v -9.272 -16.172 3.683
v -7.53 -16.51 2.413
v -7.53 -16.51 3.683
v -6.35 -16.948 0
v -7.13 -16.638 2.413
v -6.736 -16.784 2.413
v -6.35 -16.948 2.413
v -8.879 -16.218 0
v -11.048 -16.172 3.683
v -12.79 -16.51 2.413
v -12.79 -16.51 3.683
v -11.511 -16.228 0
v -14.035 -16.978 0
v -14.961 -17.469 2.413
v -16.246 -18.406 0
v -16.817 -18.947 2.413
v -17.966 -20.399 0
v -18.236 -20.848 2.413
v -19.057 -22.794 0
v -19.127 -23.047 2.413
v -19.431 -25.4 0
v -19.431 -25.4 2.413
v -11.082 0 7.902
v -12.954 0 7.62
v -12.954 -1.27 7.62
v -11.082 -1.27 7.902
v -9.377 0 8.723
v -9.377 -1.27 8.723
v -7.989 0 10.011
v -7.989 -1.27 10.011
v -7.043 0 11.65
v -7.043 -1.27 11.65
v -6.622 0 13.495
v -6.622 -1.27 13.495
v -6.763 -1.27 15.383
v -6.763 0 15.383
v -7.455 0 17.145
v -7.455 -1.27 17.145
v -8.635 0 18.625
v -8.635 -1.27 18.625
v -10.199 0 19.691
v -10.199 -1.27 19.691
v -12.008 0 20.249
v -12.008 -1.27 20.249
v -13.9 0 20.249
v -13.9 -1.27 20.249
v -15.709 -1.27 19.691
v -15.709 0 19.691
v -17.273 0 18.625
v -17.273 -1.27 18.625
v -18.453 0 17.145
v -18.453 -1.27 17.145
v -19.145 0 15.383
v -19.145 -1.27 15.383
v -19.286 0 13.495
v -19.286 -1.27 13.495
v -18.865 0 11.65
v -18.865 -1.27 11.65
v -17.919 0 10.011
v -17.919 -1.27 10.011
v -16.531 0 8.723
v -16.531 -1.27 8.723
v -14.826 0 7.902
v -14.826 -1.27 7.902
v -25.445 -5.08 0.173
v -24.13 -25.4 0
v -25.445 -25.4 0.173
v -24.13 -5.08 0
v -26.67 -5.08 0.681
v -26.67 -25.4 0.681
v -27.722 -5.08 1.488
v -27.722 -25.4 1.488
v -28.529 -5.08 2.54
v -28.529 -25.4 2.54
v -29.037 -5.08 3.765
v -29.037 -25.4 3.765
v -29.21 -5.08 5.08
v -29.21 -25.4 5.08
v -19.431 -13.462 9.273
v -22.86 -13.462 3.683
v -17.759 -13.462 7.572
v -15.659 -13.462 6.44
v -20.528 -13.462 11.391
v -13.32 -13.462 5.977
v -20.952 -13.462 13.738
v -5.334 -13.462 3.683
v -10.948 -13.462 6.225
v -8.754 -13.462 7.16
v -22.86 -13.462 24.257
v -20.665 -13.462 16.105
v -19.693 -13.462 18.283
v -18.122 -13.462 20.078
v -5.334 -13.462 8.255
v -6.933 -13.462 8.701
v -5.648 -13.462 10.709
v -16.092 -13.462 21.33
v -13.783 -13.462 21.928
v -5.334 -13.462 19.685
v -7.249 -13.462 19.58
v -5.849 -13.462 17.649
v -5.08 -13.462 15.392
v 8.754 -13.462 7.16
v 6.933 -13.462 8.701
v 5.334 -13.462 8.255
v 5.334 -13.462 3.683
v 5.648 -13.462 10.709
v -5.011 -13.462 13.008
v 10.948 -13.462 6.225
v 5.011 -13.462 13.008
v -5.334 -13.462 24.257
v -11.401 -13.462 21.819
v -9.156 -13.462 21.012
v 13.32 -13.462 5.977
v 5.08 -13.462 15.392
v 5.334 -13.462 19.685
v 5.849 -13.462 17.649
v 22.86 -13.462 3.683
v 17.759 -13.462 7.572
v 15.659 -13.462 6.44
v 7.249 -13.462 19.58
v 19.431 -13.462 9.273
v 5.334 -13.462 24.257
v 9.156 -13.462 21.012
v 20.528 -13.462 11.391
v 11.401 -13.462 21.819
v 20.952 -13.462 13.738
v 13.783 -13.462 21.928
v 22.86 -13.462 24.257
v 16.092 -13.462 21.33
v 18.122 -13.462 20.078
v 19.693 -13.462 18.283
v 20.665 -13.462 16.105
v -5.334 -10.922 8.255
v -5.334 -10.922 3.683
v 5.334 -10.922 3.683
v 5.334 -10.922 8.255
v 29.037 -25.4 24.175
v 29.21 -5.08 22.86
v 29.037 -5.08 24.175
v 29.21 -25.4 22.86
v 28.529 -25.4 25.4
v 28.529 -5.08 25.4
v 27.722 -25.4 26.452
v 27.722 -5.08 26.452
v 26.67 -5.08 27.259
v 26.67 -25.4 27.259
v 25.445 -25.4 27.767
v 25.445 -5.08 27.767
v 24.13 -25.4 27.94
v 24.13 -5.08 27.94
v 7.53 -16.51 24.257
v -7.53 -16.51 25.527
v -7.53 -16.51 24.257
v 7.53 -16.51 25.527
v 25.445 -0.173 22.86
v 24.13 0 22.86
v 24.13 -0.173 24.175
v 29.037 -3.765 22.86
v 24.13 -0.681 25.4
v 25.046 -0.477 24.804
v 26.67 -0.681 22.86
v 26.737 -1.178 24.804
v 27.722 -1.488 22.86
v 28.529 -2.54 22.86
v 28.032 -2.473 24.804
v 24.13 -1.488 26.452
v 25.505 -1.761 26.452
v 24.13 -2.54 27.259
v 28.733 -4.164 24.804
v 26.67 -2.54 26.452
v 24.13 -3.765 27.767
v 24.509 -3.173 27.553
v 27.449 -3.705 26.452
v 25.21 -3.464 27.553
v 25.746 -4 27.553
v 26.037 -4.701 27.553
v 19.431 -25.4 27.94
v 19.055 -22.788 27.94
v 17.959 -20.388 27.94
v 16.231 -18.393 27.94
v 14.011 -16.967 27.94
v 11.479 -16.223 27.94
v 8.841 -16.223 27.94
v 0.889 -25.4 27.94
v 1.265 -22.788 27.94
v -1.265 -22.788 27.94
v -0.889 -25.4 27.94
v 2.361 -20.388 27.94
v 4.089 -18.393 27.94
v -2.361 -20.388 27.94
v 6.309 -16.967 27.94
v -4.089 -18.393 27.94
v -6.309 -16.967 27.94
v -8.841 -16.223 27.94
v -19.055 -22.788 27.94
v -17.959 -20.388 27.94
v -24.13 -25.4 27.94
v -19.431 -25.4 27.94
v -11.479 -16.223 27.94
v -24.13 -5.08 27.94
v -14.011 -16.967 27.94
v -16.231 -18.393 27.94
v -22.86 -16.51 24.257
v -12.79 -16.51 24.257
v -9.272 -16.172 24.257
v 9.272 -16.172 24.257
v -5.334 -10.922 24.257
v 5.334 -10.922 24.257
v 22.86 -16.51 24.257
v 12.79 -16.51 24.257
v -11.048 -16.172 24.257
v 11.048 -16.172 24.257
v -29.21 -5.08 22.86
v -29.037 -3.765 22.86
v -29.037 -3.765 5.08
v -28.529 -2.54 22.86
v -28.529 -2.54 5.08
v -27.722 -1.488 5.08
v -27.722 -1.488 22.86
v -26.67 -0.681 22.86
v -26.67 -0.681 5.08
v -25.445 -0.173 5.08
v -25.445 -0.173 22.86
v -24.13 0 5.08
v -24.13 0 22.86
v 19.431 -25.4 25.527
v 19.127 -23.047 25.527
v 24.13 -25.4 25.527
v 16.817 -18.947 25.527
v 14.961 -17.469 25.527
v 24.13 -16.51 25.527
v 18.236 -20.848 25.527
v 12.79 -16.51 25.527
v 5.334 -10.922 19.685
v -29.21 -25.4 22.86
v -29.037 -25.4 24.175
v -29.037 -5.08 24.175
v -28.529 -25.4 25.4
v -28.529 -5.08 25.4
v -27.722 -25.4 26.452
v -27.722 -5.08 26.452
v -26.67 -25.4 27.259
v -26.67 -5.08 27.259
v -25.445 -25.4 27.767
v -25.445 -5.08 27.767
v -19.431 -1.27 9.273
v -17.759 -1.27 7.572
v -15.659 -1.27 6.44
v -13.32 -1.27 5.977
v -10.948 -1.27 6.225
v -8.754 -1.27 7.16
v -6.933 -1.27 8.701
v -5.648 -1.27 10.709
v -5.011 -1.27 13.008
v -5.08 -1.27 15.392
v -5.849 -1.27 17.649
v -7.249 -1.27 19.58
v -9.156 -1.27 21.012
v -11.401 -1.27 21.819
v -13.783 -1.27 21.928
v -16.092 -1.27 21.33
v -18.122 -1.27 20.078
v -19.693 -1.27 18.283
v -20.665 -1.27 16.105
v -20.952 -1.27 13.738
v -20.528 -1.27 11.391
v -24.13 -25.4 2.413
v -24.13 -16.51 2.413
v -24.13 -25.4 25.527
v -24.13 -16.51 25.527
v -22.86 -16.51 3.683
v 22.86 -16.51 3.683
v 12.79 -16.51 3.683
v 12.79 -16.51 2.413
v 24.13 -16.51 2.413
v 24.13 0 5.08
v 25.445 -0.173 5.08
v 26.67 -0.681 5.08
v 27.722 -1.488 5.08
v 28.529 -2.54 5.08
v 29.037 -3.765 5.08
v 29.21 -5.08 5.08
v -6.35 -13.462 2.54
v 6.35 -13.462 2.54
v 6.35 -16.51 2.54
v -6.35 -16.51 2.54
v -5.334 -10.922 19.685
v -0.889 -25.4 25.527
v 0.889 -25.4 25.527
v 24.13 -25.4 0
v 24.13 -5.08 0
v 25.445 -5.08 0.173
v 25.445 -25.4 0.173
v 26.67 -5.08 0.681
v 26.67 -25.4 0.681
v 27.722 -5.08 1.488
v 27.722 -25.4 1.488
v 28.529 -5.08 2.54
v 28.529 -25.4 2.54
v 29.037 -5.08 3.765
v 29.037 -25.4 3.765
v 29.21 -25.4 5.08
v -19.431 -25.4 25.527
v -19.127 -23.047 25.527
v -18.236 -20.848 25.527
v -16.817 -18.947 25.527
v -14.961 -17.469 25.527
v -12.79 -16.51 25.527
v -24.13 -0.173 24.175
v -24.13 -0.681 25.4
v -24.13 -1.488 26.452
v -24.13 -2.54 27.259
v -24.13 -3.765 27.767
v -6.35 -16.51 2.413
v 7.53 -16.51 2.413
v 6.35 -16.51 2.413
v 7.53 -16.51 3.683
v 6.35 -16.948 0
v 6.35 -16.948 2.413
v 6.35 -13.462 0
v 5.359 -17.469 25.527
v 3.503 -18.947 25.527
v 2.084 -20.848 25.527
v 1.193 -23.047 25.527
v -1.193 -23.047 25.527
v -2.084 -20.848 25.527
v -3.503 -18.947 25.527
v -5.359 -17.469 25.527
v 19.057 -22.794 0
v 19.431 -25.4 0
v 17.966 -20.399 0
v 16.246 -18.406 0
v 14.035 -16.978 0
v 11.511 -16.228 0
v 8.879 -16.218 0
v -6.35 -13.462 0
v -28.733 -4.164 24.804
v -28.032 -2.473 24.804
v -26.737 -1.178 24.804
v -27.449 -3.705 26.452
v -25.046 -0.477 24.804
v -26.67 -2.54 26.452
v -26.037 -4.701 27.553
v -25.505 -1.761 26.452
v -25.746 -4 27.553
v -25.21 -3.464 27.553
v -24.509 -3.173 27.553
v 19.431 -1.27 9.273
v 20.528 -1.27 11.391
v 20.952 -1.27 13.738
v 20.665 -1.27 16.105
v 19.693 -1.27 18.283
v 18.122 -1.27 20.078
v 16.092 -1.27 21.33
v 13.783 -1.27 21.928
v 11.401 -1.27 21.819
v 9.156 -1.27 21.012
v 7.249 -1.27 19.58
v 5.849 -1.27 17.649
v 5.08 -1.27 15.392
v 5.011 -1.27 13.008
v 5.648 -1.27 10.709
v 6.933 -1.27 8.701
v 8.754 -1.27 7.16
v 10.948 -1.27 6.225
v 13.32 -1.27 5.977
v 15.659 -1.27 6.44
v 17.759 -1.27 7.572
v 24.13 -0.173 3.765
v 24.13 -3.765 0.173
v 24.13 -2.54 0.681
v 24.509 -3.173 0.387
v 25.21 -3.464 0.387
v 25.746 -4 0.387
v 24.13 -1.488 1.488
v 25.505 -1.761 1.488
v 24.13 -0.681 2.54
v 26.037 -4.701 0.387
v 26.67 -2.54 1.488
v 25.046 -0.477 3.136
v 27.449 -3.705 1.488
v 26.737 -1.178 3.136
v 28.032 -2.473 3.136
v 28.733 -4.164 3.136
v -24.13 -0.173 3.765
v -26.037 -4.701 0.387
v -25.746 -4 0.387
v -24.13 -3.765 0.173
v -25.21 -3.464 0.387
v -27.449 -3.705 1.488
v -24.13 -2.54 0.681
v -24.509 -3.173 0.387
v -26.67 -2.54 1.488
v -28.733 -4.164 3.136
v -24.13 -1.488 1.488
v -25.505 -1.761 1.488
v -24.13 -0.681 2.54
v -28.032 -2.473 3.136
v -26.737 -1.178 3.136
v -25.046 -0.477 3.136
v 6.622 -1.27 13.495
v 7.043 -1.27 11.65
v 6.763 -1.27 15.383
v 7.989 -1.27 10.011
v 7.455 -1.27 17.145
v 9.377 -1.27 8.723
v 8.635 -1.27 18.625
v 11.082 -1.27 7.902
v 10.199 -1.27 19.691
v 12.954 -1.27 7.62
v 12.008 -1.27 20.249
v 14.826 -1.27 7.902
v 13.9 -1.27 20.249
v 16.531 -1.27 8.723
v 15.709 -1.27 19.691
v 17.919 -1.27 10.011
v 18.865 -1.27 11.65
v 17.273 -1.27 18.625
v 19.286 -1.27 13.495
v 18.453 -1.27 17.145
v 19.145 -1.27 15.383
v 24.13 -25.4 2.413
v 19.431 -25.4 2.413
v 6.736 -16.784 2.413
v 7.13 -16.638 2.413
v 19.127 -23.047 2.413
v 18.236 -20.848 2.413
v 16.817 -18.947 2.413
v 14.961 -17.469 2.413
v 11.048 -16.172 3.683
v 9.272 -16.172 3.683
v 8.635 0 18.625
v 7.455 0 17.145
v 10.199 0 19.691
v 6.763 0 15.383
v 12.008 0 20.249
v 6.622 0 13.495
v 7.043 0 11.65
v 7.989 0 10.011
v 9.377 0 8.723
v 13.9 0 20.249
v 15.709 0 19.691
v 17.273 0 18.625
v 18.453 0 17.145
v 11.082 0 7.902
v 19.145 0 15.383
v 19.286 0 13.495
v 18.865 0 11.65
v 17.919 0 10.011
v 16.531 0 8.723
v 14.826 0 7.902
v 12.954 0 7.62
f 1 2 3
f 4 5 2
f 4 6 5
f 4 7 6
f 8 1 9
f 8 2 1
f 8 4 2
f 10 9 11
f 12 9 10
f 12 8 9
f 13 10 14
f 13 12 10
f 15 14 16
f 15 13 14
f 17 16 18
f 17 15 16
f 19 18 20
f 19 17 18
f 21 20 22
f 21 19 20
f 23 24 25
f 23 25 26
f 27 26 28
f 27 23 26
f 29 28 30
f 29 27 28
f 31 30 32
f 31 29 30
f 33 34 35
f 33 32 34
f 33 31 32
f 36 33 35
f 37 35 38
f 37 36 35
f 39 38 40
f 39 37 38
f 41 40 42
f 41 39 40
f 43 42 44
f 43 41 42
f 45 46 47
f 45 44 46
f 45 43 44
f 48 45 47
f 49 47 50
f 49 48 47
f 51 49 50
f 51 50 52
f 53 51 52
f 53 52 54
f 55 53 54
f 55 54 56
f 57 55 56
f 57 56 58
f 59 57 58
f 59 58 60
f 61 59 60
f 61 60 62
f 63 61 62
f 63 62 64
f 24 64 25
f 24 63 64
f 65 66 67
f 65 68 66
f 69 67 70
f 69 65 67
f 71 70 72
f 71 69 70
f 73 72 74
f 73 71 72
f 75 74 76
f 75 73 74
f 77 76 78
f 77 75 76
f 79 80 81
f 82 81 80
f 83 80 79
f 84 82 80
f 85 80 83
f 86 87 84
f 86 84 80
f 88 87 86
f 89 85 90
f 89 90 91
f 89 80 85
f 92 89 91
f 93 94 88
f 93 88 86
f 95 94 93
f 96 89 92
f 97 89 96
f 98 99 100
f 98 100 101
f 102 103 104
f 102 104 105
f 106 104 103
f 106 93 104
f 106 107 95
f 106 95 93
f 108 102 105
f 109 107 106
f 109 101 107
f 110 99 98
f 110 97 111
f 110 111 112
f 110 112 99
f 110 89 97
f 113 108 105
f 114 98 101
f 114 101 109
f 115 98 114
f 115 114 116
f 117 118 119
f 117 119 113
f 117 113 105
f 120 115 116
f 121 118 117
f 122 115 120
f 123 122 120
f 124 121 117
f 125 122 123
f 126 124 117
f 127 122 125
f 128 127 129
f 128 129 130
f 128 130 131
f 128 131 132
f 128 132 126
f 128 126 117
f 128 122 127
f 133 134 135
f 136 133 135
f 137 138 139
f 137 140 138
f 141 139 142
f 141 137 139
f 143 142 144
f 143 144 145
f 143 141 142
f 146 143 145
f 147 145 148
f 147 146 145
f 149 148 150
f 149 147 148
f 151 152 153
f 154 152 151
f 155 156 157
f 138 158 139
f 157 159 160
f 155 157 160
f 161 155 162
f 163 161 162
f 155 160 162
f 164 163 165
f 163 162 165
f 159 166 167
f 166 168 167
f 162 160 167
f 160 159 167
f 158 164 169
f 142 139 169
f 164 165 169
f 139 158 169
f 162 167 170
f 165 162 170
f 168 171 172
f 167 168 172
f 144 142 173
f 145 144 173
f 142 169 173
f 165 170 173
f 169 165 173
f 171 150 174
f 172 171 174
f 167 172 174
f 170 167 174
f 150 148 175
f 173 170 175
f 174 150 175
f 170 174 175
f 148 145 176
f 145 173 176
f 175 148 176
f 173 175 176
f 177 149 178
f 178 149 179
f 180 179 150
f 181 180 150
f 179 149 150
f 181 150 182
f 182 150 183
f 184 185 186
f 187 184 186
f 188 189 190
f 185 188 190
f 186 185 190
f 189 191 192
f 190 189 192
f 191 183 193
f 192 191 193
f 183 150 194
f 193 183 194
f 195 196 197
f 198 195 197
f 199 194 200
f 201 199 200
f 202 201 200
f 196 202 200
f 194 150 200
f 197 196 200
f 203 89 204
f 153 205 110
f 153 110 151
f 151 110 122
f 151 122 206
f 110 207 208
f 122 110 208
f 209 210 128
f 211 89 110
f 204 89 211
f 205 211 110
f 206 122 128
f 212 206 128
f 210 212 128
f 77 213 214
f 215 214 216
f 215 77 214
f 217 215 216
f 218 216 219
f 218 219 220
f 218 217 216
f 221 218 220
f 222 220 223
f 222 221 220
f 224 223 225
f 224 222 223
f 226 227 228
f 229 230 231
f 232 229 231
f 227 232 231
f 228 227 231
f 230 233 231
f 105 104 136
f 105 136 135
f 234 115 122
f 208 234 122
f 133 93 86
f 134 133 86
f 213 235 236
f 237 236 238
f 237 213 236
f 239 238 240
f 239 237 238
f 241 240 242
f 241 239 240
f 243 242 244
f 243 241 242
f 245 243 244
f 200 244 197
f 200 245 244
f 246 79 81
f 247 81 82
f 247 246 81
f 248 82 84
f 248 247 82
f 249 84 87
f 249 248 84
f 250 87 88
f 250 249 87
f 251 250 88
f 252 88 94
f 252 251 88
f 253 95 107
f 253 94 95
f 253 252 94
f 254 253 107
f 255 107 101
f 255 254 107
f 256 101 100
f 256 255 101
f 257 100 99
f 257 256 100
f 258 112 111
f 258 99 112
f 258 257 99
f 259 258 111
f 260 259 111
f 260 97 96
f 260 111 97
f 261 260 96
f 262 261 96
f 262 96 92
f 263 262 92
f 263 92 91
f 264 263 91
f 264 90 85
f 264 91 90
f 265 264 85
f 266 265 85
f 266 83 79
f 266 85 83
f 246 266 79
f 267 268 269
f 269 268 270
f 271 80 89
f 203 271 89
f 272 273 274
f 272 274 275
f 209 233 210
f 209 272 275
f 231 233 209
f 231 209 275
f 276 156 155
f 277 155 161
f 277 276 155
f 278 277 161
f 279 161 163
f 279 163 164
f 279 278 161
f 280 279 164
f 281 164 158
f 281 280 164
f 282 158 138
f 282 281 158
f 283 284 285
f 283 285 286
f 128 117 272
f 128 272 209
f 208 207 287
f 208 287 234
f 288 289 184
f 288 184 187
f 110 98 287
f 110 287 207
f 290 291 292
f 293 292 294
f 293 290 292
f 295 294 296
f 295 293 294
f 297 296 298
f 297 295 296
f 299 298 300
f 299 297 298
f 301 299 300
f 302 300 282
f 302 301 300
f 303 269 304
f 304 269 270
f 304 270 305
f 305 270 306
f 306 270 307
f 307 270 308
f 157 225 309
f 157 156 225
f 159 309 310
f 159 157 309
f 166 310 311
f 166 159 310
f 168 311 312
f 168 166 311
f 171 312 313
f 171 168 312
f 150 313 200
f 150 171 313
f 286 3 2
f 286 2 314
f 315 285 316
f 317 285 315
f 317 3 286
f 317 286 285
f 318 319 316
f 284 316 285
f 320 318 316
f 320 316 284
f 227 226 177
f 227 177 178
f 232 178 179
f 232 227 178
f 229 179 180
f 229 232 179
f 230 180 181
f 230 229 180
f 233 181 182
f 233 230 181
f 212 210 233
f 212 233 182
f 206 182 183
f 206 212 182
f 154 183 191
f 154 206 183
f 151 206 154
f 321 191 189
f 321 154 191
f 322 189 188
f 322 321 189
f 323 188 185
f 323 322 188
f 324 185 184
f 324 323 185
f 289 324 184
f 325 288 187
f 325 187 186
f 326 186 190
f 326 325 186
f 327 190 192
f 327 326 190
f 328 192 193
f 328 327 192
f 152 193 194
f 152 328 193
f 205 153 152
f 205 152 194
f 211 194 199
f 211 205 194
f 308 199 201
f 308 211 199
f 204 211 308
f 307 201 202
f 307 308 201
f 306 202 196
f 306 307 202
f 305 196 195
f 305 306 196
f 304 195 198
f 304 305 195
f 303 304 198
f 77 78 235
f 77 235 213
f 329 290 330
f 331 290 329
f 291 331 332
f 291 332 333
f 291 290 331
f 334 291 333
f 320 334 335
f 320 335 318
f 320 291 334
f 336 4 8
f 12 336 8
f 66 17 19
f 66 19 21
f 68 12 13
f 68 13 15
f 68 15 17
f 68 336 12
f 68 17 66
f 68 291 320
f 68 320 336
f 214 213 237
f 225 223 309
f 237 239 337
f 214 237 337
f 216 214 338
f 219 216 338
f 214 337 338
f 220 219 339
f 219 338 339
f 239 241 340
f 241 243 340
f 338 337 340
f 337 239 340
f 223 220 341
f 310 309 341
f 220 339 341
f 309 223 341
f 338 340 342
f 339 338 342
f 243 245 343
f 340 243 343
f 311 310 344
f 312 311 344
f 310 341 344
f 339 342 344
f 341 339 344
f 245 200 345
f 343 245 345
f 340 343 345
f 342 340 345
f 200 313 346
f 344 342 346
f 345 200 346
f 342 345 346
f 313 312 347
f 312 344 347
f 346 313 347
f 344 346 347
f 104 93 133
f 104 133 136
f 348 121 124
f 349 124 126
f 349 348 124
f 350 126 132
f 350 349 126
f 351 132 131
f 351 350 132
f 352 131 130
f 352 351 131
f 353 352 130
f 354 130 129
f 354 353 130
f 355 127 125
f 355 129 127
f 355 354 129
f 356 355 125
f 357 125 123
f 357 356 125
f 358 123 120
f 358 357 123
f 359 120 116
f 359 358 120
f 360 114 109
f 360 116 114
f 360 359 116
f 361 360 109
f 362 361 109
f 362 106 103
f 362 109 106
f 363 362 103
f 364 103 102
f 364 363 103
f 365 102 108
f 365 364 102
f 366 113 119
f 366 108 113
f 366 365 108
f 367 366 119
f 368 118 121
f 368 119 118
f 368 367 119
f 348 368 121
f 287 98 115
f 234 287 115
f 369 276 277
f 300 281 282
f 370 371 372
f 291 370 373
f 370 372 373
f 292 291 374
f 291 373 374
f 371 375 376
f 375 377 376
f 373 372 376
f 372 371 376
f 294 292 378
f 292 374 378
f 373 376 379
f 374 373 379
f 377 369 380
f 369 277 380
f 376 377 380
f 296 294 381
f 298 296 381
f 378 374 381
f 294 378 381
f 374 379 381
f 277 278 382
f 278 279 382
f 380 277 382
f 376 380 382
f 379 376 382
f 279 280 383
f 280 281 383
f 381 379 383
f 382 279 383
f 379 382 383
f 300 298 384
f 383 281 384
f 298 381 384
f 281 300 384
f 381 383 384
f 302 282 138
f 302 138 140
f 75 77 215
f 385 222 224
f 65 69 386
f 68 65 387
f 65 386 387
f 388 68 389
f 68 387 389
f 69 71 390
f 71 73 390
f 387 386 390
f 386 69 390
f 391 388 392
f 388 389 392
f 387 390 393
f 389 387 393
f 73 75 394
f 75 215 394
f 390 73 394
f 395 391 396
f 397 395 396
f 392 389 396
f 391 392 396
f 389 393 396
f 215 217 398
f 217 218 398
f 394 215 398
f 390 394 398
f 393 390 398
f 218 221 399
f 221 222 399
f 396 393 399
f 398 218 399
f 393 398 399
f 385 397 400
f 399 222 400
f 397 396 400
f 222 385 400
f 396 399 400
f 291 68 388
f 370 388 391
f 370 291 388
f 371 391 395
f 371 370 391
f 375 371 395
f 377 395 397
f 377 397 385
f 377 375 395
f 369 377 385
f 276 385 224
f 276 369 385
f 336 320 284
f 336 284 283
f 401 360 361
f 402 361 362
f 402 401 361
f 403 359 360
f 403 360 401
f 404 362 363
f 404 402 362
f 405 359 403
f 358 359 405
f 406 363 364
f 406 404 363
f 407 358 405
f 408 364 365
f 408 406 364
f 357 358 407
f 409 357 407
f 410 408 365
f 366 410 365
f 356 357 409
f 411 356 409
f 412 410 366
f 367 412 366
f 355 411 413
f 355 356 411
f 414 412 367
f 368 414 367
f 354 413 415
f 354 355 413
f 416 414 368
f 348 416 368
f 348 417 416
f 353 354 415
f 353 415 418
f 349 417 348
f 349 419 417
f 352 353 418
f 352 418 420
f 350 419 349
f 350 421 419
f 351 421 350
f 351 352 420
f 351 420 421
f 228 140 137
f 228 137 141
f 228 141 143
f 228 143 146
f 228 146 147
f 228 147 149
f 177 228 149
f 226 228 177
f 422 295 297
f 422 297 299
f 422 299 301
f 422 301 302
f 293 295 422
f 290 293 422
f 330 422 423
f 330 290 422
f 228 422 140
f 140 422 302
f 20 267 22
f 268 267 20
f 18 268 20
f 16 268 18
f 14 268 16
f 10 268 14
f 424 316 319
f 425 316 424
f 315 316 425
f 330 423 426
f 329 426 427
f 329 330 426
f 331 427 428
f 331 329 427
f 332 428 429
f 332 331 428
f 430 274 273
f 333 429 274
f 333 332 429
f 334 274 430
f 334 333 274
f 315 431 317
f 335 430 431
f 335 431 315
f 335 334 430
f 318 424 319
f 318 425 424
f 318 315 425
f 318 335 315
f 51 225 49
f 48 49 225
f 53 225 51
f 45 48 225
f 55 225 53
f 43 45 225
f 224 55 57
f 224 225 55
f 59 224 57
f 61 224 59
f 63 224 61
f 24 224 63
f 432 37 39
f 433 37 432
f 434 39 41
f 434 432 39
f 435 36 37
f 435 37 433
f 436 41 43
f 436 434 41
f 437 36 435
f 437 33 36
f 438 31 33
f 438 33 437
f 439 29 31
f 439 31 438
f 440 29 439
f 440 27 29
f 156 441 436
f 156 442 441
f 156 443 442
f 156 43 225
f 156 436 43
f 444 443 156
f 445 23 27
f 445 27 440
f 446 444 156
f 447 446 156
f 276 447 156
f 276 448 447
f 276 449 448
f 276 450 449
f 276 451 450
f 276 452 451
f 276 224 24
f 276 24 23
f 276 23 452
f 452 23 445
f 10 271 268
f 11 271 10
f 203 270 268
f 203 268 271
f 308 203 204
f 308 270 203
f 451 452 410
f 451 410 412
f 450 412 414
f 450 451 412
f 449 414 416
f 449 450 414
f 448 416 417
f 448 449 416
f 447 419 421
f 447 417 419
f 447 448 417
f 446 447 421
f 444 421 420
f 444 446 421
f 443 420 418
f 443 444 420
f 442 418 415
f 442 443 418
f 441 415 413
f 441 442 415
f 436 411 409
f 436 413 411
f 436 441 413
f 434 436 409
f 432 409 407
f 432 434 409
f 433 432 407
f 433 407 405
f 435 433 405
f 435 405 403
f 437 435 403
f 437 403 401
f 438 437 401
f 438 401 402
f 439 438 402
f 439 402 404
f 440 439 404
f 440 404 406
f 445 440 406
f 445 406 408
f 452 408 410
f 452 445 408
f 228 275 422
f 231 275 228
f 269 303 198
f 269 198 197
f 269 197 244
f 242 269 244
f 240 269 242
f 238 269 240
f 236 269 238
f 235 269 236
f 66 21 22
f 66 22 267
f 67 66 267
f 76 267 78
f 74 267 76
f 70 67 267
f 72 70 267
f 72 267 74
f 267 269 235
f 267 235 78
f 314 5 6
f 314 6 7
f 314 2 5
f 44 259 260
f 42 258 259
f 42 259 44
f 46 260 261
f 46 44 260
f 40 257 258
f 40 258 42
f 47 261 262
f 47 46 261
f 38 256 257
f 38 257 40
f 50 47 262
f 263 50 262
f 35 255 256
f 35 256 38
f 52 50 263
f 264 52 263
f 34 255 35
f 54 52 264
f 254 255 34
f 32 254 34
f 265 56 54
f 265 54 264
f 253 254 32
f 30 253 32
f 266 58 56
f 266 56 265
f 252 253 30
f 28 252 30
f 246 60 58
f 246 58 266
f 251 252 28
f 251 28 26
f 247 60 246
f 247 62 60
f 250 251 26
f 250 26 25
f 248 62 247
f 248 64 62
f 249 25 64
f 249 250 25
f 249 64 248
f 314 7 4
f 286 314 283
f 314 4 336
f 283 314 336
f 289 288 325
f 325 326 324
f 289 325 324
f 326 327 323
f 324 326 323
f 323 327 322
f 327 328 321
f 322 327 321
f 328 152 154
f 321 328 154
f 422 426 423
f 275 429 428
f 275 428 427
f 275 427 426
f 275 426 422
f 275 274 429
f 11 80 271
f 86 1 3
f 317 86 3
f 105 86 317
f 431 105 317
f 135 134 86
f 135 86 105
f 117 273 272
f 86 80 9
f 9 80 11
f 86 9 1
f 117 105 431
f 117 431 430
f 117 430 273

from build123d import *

# Parameters (mm, degrees)
BOSS_EXTRUDE1_DEPTH     = 27.94
CUT_EXTRUDE1_DEPTH      = 48.739163168
CUT_EXTRUDE1_DEPTH_BACK = 48.739163168
SKETCH3_R               = 6.35
CUT_EXTRUDE2_DEPTH      = 48.73916328
CUT_EXTRUDE2_DEPTH_BACK = 24.13
SKETCH4_R               = 8.001
CUT_EXTRUDE3_REACH      = 61.268
CUT_EXTRUDE3_START      = 12.192
SKETCH5_W               = 45.72
SKETCH5_H               = 20.574
SKETCH6_W               = 10.668
SKETCH6_H               = 4.572
CUT_EXTRUDE4_DEPTH      = 2.54
SKETCH7_W               = 12.7
SKETCH7_H               = 11.938
CUT_EXTRUDE5_DEPTH      = 2.54
FILLET1_R               = 5.08
CUT_EXTRUDE6_START      = 3.048
SKETCH8_W               = 48.26
SKETCH8_H               = 23.114
CUT_EXTRUDE6_DEPTH      = 12.7


with BuildPart() as part:
    # Sketch2 → Boss-Extrude1 (new body)
    with BuildSketch(Plane.XY):
        with BuildLine():
            Line((29.21, -5.08), (29.21, -25.4))
            Line((29.21, -25.4), (19.431, -25.4))
            ThreePointArc((19.431, -25.4), (10.16, -16.129), (0.889, -25.4))
            Line((0.889, -25.4), (-0.889, -25.4))
            ThreePointArc((-0.889, -25.4), (-10.16, -16.129), (-19.431, -25.4))
            Line((-19.431, -25.4), (-29.21, -25.4))
            Line((-29.21, -25.4), (-29.21, -5.08))
            ThreePointArc((-29.21, -5.08), (-27.722102448, -1.487897552), (-24.13, 0))
            Line((-24.13, 0), (24.13, 0))
            ThreePointArc((24.13, 0), (27.722102448, -1.487897552), (29.21, -5.08))
        make_face()
    extrude(amount=BOSS_EXTRUDE1_DEPTH)

    # Sketch3 → Cut-Extrude1 (cut, two sides: drawn at the far end of the back side and taken through both)
    with BuildSketch(Plane.XZ.offset(25.4).offset(-CUT_EXTRUDE1_DEPTH_BACK)):
        with Locations(Location((-12.954, 13.97, 0), (0, 0, 270))):
            Circle(SKETCH3_R)
        with Locations(Location((12.954, 13.97, 0), (0, 0, 270))):
            Circle(SKETCH3_R)
    extrude(amount=CUT_EXTRUDE1_DEPTH + CUT_EXTRUDE1_DEPTH_BACK, mode=Mode.SUBTRACT)

    # Sketch4 → Cut-Extrude2 (cut, two sides: drawn at the far end of the back side and taken through both)
    with BuildSketch(Plane.XZ.offset(25.4).offset(-CUT_EXTRUDE2_DEPTH_BACK)):
        with Locations(Location((-12.954, 13.97, 0), (0, 0, 215.950567609))):
            Circle(SKETCH4_R)
        with Locations(Location((12.954, 13.97, 0), (0, 0, 324.04943238))):
            Circle(SKETCH4_R)
    extrude(amount=CUT_EXTRUDE2_DEPTH + CUT_EXTRUDE2_DEPTH_BACK, mode=Mode.SUBTRACT)

    # Cut-Extrude3: up to this face of the body (flat: up to its plane)
    cut_extrude3_end = Plane(part.part.faces().sort_by_distance((-24.47856499, -25.4, 13.97))[0])
    # Sketch5 → Cut-Extrude3 (cut, up to the picked face)
    with BuildSketch(Plane.XZ.offset(1.27).offset(CUT_EXTRUDE3_START), mode=Mode.PRIVATE) as cut_extrude3_sk1:
        with Locations((0, 13.97)):
            Rectangle(SKETCH5_W, SKETCH5_H)
    cut_extrude3_tool1 = split(extrude(cut_extrude3_sk1.sketch, amount=CUT_EXTRUDE3_REACH, mode=Mode.PRIVATE), bisect_by=cut_extrude3_end, keep=Keep.BOTH, mode=Mode.PRIVATE)
    add(cut_extrude3_tool1.solids().sort_by(Axis((0, -13.462, 13.97), (0, -1, 0)))[0], mode=Mode.SUBTRACT)

    # Sketch6 → Cut-Extrude4 (cut)
    with BuildSketch(Plane.XZ.offset(13.462)):
        with Locations((0, 21.971)):
            Rectangle(SKETCH6_W, SKETCH6_H)
    cut_extrude4 = extrude(amount=-CUT_EXTRUDE4_DEPTH, mode=Mode.SUBTRACT)

    # Mirror1: Cut-Extrude4 across plane
    add(cut_extrude4.mirror(Plane.XY.offset(13.97)), mode=Mode.SUBTRACT)

    # Sketch7 → Cut-Extrude5 (cut)
    with BuildSketch(Plane(origin=(0, 0, 0), x_dir=(-1, 0, 0), z_dir=(0, 0, -1))):
        with Locations((0, -19.431)):
            Rectangle(SKETCH7_W, SKETCH7_H)
    extrude(amount=-CUT_EXTRUDE5_DEPTH, mode=Mode.SUBTRACT)

    # Fillet1
    fillet1_edges = [part.edges().sort_by_distance(p)[0] for p in [
        (-29.21, -15.24, 0),
        (-27.722102448, -1.487897552, 0),
        (0, 0, 0),
        (27.722102448, -1.487897552, 27.94),
        (27.722102448, -1.487897552, 0),
        (29.21, -15.24, 0),
        (0, 0, 27.94),
        (-27.722102448, -1.487897552, 27.94),
        (-29.21, -15.24, 27.94),
        (29.21, -15.24, 27.94),
    ]]
    fillet(fillet1_edges, radius=FILLET1_R)

    # Sketch8 → Cut-Extrude6 (cut)
    with BuildSketch(Plane.XZ.offset(13.462).offset(CUT_EXTRUDE6_START)):
        with Locations((0, 13.97)):
            Rectangle(SKETCH8_W, SKETCH8_H)
    extrude(amount=CUT_EXTRUDE6_DEPTH, mode=Mode.SUBTRACT)


solid = part.part
